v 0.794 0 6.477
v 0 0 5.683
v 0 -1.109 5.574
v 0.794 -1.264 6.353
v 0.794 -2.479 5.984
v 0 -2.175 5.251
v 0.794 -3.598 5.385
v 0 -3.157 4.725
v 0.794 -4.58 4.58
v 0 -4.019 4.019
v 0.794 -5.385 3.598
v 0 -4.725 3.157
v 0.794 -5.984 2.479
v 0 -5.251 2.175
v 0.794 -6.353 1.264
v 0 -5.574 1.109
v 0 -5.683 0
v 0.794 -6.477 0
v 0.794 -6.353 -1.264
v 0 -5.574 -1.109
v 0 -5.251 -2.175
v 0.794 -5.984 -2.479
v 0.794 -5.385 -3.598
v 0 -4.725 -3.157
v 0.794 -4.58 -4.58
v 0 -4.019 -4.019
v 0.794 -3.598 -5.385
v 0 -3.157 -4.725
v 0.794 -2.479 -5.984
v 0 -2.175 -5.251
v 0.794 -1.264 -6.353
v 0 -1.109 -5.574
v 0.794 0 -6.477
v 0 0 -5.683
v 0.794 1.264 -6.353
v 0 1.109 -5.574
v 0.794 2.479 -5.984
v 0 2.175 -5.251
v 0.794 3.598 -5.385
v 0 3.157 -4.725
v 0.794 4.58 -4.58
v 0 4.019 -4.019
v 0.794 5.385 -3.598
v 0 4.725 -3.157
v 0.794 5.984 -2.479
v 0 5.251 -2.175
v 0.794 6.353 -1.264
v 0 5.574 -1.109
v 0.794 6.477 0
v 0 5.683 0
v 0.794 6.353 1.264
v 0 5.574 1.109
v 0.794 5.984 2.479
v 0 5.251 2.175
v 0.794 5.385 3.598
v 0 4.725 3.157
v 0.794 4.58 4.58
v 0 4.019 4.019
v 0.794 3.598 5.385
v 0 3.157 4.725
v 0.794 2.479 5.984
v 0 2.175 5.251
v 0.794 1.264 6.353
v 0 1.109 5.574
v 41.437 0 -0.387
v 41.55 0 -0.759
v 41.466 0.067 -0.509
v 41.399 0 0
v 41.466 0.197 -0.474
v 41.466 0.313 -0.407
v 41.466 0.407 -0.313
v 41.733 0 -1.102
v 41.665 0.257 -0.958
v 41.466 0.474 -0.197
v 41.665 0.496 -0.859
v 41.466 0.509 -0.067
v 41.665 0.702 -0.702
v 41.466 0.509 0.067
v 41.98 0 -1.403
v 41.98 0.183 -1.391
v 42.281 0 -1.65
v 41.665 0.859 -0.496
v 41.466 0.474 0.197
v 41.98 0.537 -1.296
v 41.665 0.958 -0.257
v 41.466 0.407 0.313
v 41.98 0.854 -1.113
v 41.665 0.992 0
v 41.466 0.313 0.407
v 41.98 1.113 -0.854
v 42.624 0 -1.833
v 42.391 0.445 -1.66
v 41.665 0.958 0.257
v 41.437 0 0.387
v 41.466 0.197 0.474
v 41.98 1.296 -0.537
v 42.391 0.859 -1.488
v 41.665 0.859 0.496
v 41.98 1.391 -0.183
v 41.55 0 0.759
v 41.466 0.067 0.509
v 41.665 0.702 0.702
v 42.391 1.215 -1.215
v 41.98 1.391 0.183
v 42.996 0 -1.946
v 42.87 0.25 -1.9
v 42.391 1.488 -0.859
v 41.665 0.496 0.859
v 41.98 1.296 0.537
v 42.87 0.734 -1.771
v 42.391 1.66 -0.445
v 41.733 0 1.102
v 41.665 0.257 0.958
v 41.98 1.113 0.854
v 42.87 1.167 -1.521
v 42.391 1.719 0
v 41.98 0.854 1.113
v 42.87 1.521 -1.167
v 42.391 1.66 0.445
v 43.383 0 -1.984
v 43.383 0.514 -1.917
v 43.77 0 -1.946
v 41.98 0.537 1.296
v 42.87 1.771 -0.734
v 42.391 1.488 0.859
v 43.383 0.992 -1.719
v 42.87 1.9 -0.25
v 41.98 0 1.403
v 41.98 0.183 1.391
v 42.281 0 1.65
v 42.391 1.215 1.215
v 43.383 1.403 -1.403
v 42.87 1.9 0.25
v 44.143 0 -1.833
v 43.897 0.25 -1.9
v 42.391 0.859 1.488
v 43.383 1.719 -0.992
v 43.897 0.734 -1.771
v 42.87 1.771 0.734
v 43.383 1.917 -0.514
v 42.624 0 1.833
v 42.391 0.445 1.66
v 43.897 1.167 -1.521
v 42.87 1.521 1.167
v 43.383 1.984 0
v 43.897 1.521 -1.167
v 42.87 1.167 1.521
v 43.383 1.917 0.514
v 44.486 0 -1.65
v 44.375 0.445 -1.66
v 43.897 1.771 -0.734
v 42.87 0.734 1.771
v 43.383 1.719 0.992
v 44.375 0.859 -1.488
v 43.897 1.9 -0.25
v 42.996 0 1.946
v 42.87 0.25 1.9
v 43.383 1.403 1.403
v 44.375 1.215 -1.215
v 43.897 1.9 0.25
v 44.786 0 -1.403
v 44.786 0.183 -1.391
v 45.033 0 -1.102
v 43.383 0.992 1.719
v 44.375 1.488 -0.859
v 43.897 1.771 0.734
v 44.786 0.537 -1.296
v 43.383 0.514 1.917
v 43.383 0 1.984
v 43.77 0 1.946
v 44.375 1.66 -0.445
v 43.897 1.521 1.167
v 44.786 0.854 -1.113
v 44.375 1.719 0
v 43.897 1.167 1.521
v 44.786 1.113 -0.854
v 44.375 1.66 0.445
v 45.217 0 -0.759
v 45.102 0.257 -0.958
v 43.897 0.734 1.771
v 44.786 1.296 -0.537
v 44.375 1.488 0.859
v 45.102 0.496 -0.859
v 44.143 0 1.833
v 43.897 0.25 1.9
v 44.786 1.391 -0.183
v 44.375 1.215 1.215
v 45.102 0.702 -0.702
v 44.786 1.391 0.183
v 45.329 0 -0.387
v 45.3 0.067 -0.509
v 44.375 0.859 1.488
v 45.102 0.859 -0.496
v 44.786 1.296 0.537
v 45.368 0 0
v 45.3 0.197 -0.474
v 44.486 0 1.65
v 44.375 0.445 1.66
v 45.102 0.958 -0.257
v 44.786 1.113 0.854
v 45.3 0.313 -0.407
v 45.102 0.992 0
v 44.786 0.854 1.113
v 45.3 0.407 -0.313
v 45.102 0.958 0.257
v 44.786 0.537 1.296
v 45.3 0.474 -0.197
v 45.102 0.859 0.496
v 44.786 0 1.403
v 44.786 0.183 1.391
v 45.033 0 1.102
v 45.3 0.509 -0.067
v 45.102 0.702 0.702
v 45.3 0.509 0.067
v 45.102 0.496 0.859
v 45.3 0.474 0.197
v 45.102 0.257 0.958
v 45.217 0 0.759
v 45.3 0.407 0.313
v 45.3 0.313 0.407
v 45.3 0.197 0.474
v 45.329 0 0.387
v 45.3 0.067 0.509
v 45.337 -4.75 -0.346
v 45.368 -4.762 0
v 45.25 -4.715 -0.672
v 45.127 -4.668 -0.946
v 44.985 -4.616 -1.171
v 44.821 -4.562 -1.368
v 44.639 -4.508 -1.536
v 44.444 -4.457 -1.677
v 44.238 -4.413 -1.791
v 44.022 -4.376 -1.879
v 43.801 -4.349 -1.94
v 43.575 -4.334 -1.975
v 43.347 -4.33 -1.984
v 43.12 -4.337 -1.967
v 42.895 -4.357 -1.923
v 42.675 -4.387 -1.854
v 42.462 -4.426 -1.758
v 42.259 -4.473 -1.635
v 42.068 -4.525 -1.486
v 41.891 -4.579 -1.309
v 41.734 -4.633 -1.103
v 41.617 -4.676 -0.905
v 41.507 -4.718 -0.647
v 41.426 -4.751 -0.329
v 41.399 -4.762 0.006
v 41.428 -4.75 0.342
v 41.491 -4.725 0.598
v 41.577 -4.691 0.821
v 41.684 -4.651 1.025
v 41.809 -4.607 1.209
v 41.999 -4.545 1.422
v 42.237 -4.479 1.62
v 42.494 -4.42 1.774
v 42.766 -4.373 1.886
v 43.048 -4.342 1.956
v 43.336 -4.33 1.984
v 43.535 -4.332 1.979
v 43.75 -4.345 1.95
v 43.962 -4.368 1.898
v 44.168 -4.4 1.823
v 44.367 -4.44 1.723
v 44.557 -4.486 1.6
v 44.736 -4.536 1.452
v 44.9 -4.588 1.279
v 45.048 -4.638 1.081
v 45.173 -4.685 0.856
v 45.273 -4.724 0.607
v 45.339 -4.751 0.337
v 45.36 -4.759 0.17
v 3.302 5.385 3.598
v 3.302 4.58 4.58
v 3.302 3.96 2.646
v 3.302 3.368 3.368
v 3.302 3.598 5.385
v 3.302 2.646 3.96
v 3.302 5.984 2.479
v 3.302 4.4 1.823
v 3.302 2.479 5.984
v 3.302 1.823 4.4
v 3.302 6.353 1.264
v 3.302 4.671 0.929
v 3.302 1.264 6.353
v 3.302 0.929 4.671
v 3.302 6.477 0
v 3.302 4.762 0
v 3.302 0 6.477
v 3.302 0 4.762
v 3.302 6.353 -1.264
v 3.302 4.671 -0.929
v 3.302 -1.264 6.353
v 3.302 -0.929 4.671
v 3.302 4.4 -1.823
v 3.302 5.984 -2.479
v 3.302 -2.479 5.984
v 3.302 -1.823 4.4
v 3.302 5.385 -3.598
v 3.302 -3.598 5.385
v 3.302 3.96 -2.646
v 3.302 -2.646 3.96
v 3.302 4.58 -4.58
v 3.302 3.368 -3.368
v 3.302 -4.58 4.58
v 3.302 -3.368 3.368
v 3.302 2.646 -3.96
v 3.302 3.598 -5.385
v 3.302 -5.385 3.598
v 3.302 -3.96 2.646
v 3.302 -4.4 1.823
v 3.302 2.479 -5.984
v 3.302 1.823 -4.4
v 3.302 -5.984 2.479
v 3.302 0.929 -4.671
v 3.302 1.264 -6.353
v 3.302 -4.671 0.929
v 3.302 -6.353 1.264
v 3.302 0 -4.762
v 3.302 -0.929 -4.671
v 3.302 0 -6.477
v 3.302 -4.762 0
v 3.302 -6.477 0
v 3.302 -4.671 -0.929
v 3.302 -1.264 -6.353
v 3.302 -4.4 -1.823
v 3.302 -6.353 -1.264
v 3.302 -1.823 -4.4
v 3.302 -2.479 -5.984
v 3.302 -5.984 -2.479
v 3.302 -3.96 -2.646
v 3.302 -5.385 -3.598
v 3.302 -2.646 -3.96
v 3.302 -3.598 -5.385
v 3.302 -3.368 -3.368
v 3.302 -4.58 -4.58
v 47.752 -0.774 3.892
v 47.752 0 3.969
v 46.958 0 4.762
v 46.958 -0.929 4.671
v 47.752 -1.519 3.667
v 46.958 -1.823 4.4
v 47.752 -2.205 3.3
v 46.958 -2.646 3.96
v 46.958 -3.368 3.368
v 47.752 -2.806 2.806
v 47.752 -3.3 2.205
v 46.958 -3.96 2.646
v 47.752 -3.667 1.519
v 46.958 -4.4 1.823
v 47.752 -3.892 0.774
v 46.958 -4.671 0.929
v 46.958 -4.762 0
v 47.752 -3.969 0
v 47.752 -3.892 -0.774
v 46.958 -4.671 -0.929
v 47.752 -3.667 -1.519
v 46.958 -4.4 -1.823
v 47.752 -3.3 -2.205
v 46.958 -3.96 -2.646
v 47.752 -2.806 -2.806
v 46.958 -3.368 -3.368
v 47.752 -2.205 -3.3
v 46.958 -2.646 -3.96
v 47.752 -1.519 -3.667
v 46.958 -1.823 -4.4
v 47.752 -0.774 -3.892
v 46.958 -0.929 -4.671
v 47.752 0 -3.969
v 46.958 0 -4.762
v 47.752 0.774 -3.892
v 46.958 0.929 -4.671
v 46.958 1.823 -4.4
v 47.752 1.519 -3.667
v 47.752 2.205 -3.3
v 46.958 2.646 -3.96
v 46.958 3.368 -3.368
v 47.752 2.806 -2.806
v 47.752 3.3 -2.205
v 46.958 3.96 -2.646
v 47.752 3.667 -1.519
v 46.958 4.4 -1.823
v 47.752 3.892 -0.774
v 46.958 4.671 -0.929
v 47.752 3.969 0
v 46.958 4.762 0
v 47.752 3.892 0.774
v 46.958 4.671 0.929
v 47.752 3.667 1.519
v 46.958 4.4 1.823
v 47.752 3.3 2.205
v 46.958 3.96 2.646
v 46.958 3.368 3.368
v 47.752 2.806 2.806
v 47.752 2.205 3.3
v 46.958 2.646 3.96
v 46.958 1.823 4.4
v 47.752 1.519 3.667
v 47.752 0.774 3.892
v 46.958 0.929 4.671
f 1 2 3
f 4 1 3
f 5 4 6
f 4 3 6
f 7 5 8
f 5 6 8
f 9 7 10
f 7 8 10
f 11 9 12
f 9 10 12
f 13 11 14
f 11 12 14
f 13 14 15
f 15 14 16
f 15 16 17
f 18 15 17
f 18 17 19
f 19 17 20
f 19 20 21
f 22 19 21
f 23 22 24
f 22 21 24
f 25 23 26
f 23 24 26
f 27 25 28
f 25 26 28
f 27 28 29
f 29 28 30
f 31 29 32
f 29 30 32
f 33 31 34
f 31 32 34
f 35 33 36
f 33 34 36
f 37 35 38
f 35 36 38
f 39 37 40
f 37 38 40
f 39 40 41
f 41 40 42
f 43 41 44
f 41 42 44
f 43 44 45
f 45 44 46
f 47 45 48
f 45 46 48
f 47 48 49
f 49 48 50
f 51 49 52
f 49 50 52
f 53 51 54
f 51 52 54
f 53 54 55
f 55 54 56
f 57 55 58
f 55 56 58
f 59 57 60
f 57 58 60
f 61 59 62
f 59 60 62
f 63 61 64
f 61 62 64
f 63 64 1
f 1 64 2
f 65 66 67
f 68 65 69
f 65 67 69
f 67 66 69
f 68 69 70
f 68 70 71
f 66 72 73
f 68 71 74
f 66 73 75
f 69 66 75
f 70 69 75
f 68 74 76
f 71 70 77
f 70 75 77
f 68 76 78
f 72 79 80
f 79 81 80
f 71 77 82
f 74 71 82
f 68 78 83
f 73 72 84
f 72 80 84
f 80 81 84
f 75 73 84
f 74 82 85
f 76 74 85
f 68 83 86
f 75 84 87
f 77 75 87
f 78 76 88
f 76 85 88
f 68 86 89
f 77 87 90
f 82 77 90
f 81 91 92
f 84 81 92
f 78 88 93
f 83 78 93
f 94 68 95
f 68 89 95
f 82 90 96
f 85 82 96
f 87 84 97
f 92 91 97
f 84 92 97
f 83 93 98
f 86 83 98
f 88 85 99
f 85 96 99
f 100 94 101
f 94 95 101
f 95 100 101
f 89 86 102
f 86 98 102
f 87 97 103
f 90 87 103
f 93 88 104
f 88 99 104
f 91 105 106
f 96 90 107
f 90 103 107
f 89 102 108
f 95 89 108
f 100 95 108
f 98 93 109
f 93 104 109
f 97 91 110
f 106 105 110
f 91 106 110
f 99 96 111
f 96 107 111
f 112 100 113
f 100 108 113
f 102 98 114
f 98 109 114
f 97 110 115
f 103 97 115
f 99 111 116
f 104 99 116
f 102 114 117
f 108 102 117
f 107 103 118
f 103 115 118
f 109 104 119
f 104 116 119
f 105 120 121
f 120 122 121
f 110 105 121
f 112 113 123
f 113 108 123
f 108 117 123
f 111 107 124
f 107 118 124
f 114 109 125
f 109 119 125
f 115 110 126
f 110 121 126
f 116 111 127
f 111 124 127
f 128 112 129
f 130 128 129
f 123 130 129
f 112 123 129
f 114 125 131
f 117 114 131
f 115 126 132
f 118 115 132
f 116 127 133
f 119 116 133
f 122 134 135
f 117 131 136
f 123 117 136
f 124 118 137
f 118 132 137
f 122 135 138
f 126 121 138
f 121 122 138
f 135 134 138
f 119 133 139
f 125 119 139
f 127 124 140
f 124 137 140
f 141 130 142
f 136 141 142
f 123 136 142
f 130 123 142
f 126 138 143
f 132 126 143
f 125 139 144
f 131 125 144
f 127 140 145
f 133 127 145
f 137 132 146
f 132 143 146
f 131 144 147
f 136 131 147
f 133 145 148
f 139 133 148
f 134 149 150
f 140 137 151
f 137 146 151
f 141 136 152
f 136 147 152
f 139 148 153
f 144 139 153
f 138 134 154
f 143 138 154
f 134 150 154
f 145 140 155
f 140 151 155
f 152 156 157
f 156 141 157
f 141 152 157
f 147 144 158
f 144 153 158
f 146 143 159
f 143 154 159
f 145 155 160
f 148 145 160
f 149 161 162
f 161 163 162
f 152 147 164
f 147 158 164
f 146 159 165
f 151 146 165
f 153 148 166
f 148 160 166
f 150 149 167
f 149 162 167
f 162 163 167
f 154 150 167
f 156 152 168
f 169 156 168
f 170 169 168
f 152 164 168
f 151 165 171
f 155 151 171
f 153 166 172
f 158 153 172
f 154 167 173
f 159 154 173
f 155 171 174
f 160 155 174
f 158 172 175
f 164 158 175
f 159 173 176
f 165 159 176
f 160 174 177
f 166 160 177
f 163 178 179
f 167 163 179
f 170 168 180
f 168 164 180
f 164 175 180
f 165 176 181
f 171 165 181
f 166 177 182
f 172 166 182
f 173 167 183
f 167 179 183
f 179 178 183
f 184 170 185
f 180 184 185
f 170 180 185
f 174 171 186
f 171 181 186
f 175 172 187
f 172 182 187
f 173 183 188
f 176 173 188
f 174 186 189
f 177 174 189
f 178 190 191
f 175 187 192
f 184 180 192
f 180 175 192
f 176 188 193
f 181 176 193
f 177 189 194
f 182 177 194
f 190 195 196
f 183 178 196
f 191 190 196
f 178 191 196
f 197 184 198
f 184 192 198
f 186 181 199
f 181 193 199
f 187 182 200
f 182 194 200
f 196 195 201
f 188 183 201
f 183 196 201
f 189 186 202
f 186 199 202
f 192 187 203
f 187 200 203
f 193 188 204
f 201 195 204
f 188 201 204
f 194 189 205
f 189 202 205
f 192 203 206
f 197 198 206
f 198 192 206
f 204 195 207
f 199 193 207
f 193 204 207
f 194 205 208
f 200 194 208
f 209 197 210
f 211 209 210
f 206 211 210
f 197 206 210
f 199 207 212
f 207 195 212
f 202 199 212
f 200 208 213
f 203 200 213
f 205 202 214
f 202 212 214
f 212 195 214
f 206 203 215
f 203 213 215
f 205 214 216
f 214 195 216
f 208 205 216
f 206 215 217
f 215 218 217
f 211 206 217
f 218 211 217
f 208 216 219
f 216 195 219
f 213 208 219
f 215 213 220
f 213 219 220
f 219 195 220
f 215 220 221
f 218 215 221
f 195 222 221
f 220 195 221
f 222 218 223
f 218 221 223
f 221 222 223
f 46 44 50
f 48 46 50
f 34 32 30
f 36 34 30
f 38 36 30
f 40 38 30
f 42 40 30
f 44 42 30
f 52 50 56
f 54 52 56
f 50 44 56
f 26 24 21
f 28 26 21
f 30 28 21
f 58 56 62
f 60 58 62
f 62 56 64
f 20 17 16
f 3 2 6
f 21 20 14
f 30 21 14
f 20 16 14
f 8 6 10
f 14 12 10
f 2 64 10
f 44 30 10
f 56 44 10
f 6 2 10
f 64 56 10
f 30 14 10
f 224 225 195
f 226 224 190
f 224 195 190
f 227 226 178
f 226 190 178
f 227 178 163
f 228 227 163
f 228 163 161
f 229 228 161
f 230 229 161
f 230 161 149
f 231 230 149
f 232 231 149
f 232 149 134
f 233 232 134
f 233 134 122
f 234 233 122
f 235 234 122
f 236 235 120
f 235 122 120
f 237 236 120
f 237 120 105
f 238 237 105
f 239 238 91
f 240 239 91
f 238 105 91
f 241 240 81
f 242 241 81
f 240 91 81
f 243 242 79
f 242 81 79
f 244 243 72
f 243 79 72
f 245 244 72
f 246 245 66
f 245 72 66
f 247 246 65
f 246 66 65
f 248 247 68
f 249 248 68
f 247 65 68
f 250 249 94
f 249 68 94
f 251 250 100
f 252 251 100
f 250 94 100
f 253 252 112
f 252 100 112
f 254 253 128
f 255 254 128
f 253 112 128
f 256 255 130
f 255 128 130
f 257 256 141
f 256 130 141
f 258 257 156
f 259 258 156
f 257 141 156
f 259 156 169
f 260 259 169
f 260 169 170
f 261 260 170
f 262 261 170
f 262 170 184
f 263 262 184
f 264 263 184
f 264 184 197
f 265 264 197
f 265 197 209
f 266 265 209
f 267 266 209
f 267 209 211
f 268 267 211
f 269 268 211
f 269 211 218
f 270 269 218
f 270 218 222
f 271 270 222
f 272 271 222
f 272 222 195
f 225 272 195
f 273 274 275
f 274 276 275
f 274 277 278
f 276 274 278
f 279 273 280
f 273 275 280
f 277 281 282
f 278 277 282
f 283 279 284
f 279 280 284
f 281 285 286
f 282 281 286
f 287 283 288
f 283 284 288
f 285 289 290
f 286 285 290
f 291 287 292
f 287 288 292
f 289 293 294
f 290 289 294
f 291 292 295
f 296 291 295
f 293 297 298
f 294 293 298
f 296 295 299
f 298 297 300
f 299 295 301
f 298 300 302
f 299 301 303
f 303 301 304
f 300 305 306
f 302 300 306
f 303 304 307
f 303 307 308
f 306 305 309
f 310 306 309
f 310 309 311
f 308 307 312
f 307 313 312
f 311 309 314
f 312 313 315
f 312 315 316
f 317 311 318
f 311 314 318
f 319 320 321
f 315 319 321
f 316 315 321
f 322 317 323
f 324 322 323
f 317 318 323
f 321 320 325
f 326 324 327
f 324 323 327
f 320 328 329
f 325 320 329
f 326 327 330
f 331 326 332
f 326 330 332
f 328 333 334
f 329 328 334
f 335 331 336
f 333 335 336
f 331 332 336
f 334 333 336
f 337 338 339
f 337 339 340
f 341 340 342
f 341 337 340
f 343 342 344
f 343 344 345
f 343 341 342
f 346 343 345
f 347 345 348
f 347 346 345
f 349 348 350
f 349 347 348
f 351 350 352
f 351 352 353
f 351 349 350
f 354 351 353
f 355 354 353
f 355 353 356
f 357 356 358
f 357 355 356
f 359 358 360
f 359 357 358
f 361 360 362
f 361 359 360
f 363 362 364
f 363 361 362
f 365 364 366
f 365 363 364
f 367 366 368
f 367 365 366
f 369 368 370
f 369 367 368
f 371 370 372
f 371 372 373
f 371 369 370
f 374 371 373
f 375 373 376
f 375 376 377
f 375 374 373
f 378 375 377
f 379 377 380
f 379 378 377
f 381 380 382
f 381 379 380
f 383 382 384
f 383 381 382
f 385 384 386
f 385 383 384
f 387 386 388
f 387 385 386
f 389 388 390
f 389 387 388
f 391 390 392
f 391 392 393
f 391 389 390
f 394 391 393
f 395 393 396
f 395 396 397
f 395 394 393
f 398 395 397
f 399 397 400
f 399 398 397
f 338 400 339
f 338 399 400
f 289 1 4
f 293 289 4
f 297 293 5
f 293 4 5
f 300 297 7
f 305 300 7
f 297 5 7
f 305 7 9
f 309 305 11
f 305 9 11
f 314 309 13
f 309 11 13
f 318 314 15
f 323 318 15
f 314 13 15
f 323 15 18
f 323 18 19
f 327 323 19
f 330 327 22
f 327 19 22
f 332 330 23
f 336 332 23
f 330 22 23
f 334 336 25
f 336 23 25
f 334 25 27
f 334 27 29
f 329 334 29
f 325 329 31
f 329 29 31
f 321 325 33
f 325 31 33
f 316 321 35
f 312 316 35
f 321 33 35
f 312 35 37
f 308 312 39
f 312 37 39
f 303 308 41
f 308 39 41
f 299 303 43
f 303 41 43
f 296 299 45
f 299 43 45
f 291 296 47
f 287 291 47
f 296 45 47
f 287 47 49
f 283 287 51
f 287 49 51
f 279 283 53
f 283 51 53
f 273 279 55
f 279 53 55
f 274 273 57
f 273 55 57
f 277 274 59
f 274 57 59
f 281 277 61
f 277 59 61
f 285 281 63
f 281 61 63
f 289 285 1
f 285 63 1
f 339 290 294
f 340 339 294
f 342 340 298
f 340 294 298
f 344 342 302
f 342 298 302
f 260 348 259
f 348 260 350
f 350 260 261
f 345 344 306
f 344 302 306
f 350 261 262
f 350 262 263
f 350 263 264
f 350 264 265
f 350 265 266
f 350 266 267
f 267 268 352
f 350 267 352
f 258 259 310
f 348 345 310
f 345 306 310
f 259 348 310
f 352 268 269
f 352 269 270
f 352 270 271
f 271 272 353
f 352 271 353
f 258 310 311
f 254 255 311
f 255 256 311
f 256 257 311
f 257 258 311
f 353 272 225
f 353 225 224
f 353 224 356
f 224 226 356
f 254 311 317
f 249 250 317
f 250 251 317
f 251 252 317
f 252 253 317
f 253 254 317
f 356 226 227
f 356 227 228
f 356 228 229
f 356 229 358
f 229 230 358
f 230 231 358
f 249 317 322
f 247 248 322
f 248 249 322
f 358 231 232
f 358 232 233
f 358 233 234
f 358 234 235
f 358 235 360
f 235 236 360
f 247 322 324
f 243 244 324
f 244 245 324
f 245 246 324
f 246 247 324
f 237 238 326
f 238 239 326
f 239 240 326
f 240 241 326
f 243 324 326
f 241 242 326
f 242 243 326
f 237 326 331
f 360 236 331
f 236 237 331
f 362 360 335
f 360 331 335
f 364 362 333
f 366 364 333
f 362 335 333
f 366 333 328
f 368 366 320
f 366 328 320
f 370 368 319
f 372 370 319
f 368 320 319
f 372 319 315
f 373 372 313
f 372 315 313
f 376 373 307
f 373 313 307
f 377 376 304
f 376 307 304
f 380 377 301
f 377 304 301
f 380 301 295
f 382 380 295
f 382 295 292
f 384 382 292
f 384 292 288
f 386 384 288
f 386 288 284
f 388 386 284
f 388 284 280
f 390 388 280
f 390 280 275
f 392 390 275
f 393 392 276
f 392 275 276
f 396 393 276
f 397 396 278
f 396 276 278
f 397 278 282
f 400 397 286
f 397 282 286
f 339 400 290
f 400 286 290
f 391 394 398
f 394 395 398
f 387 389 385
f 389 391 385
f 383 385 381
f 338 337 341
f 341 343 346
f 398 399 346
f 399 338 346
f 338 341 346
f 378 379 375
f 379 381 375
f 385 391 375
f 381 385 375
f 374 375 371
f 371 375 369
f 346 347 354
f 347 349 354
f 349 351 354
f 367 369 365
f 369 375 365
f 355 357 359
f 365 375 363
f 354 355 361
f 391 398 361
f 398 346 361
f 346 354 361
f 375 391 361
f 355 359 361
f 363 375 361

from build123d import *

# Parameters (mm, degrees)
F2_D     = 3.96875
F2_DEPTH = 6.478
F3_SIZE  = 0.79375


with BuildPart() as f1:
    # F0 (on Front) → F1 (revolve)
    with BuildSketch(Plane.XZ):
        with BuildLine():
            Line((0, 6.477), (0, 0))
            Line((0, 0), (41.398825, 0))
            ThreePointArc((41.398825, 0), (43.3832, 1.984375), (45.367575, 0))
            Line((45.367575, 0), (47.752, 0))
            Line((47.752, 0), (47.752, 4.7625))
            Line((47.752, 4.7625), (3.302, 4.7625))
            Line((3.302, 4.7625), (3.302, 6.477))
            Line((3.302, 6.477), (0, 6.477))
        make_face()
        with BuildLine():
            ThreePointArc((45.367575, 0), (43.3832, 1.984375), (41.398825, 0))
            Line((41.398825, 0), (45.367575, 0))
        make_face()
        with BuildLine():
            Line((45.367575, 0), (41.398825, 0))
            ThreePointArc((41.398825, 0), (43.3832, -1.984375), (45.367575, 0))
        make_face()
    revolve(axis=Axis((23.876, 0, 0), (1, 0, 0)))

    # F2 (through all, one way)
    with BuildSketch(Plane(origin=(0, 0, 0), x_dir=(1, 0, 0), z_dir=(0, 1, 0))):
        with Locations((43.3832, 0)):
            Circle(F2_D / 2)
    extrude(amount=-F2_DEPTH, mode=Mode.SUBTRACT)

    # F3
    f3_edges = [f1.edges().sort_by_distance(p)[0] for p in [
        (47.752, 0, -4.7625),
        (0, 0, -6.477),
    ]]
    chamfer(f3_edges, length=F3_SIZE)


solid = f1.part
